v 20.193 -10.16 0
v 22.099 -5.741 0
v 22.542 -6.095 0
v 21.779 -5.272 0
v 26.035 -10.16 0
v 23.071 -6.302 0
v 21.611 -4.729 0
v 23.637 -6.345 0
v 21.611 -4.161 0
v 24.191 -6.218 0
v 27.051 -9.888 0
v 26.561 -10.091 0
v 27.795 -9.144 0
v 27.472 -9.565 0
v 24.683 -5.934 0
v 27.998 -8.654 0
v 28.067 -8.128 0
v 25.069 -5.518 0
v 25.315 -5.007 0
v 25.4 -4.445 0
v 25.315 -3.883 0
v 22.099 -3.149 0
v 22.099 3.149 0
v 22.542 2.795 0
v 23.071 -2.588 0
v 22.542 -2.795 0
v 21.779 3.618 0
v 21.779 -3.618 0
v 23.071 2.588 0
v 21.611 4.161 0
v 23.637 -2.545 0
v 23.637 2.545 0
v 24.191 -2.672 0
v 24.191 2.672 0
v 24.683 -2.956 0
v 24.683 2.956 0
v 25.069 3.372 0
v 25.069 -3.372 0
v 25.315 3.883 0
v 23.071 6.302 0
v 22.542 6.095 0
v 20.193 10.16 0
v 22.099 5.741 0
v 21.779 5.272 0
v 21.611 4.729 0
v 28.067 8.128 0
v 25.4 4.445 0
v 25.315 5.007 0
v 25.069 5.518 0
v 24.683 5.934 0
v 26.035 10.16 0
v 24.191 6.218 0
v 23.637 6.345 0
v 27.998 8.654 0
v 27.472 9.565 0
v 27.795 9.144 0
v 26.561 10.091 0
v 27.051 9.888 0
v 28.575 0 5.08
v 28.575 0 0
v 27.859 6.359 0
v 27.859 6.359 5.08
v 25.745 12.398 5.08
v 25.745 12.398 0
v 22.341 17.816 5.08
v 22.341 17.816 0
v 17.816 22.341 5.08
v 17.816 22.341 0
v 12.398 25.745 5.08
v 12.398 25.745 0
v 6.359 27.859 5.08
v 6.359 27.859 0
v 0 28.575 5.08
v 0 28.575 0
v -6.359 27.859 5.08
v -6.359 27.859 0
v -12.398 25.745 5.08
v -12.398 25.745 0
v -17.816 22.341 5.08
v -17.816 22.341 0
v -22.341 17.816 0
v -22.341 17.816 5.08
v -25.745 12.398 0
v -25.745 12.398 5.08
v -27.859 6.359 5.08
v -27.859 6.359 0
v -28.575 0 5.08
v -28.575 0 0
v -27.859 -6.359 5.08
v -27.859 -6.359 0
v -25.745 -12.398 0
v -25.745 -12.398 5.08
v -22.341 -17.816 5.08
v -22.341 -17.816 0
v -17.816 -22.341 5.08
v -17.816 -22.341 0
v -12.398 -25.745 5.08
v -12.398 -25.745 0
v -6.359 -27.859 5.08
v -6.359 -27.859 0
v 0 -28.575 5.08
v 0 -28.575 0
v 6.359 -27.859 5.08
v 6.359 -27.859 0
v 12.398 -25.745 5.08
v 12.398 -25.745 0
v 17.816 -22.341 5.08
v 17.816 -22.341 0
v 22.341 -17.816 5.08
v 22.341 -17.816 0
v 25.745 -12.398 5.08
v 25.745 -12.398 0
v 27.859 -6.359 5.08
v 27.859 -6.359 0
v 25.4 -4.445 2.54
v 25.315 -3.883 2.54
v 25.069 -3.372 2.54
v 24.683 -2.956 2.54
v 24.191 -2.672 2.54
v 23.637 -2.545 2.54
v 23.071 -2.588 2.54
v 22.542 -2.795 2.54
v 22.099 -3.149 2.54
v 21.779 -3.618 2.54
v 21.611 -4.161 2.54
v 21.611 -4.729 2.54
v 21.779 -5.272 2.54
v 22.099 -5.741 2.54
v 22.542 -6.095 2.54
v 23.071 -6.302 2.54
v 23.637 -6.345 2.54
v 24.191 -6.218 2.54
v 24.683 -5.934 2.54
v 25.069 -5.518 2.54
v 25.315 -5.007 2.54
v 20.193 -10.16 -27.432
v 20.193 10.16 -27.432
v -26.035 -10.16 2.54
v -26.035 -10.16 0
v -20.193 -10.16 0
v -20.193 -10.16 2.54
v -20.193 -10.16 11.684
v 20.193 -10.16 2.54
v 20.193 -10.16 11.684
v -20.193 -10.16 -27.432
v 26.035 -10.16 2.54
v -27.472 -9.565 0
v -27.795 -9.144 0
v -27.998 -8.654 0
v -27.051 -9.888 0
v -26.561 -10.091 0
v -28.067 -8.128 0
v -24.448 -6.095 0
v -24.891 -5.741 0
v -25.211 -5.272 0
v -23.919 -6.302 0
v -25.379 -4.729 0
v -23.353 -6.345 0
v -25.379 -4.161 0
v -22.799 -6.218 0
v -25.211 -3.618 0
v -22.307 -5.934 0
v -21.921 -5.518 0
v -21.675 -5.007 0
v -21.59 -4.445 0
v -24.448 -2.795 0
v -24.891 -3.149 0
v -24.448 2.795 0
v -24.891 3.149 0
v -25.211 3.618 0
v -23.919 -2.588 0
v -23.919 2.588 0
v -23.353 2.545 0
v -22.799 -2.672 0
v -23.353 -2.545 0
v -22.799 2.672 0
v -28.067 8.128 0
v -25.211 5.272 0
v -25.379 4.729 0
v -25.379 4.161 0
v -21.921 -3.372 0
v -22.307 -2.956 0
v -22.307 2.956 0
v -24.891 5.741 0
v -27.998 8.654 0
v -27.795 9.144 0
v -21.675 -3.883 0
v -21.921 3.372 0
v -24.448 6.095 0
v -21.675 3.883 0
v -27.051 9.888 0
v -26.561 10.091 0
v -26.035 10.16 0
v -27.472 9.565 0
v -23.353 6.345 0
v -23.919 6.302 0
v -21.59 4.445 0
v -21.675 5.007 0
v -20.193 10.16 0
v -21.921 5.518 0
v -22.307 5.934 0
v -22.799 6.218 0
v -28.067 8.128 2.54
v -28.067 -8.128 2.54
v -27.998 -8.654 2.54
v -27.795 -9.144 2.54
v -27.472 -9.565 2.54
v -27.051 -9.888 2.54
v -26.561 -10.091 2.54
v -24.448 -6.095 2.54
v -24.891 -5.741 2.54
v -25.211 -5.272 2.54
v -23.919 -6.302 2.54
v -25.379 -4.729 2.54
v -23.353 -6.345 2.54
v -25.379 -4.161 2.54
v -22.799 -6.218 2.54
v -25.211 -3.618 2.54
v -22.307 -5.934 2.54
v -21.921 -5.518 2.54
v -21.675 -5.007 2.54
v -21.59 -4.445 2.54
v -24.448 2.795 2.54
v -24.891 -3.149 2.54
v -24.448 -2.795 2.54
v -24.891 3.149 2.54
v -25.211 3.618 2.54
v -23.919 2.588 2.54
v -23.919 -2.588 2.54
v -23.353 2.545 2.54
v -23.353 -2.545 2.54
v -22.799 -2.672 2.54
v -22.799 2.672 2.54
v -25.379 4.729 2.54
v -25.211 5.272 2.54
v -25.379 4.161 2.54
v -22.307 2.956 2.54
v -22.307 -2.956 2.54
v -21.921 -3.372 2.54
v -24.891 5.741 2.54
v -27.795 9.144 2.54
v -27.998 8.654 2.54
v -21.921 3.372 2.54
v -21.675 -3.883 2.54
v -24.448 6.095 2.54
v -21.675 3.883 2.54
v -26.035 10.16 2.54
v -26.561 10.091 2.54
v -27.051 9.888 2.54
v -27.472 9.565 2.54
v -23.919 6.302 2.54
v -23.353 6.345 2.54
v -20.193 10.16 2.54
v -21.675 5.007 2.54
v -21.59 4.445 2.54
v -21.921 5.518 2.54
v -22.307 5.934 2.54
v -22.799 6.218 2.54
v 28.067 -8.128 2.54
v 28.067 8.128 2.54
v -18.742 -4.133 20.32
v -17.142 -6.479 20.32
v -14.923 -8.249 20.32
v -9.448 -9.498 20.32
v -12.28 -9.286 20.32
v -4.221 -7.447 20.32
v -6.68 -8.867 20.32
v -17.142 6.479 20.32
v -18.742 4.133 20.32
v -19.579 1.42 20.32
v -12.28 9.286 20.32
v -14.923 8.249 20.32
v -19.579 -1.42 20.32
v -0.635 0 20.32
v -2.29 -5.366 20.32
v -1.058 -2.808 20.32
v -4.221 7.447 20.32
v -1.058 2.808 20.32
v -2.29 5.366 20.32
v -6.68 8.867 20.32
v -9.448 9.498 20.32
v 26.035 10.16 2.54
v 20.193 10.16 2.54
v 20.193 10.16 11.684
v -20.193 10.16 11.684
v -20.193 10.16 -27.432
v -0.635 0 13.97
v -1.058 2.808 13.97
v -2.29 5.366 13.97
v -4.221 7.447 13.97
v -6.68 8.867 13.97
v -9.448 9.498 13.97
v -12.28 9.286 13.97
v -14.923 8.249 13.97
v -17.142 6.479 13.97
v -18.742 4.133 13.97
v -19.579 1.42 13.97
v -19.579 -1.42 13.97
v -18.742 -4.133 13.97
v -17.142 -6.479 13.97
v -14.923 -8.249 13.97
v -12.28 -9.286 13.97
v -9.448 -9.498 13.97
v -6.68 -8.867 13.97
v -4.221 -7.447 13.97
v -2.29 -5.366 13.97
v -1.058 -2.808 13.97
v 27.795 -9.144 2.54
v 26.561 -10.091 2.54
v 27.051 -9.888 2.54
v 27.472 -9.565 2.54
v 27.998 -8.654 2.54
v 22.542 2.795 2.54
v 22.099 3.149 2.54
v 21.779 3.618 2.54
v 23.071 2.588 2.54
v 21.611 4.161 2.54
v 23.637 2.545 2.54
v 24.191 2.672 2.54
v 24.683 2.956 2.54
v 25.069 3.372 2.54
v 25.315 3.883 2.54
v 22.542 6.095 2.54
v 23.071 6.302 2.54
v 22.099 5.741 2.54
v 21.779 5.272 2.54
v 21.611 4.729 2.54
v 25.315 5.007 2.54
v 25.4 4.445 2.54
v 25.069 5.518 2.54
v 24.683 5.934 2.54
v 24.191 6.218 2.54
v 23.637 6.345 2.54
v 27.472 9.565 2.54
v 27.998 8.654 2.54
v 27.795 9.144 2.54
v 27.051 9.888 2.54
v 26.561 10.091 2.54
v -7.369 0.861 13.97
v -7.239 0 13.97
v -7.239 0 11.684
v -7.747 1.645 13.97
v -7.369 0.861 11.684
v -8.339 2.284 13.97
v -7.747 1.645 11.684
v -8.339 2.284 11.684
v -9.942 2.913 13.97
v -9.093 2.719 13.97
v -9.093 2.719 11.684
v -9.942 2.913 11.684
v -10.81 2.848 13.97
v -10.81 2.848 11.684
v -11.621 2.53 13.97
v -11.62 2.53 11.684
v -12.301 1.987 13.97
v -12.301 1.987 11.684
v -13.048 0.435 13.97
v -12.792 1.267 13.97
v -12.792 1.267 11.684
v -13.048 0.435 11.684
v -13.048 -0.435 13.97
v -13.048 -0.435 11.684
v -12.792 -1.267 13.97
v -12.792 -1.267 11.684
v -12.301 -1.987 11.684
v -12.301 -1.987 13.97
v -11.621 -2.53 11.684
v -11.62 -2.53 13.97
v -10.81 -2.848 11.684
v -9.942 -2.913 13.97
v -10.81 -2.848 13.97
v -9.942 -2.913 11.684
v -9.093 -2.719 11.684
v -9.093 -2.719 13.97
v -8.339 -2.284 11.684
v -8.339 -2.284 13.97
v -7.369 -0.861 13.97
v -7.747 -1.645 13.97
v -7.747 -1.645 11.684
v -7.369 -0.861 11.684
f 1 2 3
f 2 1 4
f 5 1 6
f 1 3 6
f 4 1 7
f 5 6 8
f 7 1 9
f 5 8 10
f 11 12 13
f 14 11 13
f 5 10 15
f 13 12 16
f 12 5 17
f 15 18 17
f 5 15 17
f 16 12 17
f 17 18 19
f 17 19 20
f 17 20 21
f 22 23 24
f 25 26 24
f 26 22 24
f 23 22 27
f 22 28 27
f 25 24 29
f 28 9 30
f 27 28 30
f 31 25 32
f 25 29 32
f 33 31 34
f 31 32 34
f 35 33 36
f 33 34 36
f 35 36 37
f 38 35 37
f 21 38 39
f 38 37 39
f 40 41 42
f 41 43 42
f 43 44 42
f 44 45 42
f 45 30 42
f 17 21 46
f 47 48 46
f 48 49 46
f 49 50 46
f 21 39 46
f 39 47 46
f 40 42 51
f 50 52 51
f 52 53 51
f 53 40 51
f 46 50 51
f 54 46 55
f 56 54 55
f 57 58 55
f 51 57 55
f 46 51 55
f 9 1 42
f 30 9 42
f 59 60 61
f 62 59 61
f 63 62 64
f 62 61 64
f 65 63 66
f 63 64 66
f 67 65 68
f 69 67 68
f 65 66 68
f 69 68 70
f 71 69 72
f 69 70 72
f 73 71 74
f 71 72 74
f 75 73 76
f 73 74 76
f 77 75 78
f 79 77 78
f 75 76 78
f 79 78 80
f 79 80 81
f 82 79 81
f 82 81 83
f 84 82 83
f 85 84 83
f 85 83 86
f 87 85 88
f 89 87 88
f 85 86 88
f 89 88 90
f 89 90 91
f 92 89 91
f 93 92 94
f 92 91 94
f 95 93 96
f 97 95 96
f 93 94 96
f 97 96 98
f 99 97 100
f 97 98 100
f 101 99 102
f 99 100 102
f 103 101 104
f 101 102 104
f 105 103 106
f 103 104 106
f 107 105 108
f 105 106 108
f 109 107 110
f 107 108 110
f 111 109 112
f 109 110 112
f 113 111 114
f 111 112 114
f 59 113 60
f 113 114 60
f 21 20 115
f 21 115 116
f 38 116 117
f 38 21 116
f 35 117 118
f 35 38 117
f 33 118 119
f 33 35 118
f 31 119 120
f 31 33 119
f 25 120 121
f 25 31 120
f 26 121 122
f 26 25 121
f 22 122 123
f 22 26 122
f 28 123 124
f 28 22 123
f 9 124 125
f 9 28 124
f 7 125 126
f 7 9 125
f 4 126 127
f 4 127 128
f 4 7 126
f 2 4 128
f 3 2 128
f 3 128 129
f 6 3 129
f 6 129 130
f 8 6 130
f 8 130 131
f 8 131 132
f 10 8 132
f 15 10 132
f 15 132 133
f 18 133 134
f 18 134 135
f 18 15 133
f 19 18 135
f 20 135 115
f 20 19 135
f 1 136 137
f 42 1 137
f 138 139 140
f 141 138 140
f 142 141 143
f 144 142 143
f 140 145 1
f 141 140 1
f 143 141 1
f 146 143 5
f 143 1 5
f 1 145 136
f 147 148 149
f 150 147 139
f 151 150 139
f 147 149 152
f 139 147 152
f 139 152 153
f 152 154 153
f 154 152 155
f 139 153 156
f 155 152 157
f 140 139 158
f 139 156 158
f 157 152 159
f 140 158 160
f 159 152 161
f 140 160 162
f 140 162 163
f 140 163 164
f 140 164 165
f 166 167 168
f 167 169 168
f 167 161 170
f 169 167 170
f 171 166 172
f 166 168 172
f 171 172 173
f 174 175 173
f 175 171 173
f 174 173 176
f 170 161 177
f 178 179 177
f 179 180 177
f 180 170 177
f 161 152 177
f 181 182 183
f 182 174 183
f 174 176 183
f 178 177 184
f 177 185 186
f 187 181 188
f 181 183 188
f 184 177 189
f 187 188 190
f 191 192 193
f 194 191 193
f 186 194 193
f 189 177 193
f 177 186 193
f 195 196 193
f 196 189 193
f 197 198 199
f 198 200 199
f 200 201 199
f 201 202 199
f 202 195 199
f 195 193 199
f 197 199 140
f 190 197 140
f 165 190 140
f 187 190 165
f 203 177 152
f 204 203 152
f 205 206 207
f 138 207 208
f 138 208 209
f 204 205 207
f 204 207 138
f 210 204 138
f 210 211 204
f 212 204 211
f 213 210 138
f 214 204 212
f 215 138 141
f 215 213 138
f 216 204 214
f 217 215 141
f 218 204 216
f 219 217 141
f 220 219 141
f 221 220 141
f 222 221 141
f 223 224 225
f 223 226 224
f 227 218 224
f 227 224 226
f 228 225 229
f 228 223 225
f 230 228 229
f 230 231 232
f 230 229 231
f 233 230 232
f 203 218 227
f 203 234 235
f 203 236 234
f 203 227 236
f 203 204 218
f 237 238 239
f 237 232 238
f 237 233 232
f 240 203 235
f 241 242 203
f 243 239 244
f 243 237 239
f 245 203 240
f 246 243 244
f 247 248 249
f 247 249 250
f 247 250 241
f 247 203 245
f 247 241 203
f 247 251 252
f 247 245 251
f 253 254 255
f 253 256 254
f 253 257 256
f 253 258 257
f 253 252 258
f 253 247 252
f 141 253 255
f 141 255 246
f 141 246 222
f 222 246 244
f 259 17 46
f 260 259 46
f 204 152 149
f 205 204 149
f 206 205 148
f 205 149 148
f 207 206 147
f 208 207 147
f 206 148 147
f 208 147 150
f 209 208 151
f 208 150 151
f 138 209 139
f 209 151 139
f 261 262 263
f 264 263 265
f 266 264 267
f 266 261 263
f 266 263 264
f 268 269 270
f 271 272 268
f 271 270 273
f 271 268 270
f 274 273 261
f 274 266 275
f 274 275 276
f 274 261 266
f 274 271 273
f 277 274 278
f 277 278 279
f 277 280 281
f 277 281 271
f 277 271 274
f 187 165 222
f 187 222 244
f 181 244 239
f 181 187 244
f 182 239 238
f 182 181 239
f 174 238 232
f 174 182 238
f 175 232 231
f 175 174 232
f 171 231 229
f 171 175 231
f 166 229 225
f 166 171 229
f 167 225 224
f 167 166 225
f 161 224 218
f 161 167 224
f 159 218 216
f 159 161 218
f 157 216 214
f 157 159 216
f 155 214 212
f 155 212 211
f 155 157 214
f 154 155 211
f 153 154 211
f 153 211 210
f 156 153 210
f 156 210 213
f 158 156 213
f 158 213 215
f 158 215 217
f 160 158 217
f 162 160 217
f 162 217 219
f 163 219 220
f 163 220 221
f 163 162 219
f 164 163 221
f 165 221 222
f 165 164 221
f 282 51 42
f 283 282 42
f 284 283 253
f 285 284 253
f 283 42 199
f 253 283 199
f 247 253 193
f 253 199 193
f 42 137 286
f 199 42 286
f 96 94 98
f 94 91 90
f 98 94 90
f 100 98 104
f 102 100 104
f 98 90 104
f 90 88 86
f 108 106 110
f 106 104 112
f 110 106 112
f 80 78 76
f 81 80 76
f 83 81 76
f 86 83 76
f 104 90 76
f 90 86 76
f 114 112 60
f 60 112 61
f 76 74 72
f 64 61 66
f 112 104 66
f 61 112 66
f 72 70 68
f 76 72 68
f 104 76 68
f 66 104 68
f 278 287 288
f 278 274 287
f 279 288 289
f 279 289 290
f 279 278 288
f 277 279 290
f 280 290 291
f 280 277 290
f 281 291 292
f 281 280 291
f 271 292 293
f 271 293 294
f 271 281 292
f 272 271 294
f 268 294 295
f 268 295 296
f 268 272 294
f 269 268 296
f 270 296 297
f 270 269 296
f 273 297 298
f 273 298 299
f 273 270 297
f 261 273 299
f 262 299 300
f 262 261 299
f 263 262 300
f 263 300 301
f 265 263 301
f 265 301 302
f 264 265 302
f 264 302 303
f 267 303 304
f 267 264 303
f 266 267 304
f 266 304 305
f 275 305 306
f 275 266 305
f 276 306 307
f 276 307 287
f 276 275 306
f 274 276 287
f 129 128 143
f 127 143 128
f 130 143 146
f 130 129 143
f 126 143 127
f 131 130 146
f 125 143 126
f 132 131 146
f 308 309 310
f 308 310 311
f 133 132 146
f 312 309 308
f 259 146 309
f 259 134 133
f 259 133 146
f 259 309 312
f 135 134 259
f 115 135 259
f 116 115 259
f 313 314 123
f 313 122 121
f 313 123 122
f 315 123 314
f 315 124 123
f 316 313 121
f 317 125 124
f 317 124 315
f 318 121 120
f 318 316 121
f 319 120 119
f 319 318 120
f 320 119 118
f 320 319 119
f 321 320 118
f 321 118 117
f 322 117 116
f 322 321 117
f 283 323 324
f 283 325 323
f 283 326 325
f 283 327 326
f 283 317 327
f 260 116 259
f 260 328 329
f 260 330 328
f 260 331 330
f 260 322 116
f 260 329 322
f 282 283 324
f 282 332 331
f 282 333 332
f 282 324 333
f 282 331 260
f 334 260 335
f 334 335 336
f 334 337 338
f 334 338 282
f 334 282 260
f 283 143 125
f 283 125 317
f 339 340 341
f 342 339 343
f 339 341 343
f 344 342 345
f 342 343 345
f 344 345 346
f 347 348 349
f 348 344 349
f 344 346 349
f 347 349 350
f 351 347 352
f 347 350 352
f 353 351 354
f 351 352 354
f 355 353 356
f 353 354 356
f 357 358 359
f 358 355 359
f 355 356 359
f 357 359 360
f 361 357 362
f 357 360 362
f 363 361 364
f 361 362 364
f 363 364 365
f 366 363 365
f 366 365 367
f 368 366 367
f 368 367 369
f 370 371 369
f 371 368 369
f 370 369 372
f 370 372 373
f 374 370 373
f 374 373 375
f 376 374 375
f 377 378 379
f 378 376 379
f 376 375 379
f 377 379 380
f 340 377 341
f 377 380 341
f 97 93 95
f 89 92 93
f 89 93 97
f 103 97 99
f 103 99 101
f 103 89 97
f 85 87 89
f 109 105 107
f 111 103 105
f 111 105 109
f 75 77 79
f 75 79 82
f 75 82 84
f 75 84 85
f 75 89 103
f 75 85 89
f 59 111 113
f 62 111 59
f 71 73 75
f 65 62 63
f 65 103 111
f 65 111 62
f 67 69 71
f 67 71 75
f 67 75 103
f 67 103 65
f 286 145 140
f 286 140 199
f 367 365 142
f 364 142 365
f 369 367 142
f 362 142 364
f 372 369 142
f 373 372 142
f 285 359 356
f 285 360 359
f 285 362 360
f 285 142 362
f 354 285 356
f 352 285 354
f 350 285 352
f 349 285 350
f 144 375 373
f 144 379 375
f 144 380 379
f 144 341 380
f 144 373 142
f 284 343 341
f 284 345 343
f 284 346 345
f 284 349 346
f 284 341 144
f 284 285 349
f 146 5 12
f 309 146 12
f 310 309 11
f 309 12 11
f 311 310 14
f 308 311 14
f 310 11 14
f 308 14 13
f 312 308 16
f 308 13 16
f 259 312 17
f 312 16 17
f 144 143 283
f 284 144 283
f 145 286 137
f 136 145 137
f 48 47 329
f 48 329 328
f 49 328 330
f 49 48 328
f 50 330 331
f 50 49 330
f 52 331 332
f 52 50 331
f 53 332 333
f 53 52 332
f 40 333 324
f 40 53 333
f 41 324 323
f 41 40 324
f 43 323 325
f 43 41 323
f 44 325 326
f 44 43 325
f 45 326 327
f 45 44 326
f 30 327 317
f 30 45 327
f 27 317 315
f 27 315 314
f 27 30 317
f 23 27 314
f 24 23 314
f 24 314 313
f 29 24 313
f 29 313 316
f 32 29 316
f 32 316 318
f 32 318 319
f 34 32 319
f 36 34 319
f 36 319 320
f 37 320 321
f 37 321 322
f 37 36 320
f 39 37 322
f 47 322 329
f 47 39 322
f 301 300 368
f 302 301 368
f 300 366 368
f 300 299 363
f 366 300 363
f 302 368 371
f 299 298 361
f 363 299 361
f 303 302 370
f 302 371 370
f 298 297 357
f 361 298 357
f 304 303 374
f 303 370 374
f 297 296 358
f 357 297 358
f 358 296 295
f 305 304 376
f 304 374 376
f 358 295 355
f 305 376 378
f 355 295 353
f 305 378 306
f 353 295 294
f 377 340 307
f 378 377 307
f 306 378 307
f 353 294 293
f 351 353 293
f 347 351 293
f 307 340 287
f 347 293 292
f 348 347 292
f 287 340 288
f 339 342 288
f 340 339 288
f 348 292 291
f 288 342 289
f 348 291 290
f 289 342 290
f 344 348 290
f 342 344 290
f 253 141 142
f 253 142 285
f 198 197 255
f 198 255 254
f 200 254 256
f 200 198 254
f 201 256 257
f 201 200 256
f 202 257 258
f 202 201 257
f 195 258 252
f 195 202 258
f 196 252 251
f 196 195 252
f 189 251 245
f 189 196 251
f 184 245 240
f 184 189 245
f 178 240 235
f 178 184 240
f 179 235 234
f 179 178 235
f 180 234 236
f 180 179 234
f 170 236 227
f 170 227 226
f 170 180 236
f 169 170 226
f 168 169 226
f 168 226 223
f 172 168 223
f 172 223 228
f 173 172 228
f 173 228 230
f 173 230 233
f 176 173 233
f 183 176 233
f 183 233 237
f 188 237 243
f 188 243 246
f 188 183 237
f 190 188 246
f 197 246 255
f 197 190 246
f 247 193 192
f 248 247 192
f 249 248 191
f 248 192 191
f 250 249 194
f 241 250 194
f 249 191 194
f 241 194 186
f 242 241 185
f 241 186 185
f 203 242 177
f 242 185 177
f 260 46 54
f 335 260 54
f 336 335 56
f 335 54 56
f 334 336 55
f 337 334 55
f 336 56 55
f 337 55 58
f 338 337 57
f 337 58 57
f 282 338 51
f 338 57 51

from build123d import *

# Parameters (mm, degrees)
F0_W          = 40.386
F0_H          = 20.32
F1_DEPTH      = 27.432
F1_DEPTH_BACK = 11.684
F2_R          = 1.905
F3_DEPTH      = 2.54
F4_R          = 2.921
F5_DEPTH      = 5.334
F6_R          = 9.525
F7_DEPTH      = 3.302
F7_DEPTH_BACK = 3.048
F8_R          = 28.575
F9_DEPTH      = 5.08


with BuildPart() as f1:
    # F0 (on Top) → F1 (new body, two sides)
    with BuildSketch(Plane.XY) as f1_sk:
        Rectangle(F0_W, F0_H)
    extrude(amount=-F1_DEPTH)
    extrude(f1_sk.sketch, amount=F1_DEPTH_BACK)

    # F2 (on Top) → F3 (join)
    with BuildSketch(Plane.XY):
        with BuildLine():
            Line((26.035, 10.16), (-26.035, 10.16))
            ThreePointArc((-26.035, 10.16), (-27.4718409794, 9.5648409794), (-28.067, 8.128))
            Line((-28.067, 8.128), (-28.067, -8.128))
            ThreePointArc((-28.067, -8.128), (-27.4718409794, -9.5648409794), (-26.035, -10.16))
            Line((-26.035, -10.16), (26.035, -10.16))
            ThreePointArc((26.035, -10.16), (27.4718409794, -9.5648409794), (28.067, -8.128))
            Line((28.067, -8.128), (28.067, 8.128))
            ThreePointArc((28.067, 8.128), (27.4718409794, 9.5648409794), (26.035, 10.16))
        make_face()
        with Locations((-23.495, -4.445)):
            Circle(F2_R, mode=Mode.SUBTRACT)
        with Locations((23.495, -4.445)):
            Circle(F2_R, mode=Mode.SUBTRACT)
        with Locations((-23.495, 4.445)):
            Circle(F2_R, mode=Mode.SUBTRACT)
        with Locations((23.495, 4.445)):
            Circle(F2_R, mode=Mode.SUBTRACT)
    extrude(amount=F3_DEPTH)

    # F4 (on face) → F5 (join)
    with BuildSketch(Plane.XY.offset(11.684)):
        with Locations((-10.16, 0)):
            Circle(F4_R)
    extrude(amount=F5_DEPTH)

    # F6 (on face) → F7 (join, two sides)
    with BuildSketch(Plane.XY.offset(17.018)) as f7_sk:
        with Locations((-10.16, 0)):
            Circle(F6_R)
    extrude(amount=F7_DEPTH)
    extrude(f7_sk.sketch, amount=-F7_DEPTH_BACK)


with BuildPart() as f9:
    # F8 (on Top) → F9 (new body)
    with BuildSketch(Plane.XY):
        Circle(F8_R)
    extrude(amount=F9_DEPTH)


solid = Compound([f1.part, f9.part])
